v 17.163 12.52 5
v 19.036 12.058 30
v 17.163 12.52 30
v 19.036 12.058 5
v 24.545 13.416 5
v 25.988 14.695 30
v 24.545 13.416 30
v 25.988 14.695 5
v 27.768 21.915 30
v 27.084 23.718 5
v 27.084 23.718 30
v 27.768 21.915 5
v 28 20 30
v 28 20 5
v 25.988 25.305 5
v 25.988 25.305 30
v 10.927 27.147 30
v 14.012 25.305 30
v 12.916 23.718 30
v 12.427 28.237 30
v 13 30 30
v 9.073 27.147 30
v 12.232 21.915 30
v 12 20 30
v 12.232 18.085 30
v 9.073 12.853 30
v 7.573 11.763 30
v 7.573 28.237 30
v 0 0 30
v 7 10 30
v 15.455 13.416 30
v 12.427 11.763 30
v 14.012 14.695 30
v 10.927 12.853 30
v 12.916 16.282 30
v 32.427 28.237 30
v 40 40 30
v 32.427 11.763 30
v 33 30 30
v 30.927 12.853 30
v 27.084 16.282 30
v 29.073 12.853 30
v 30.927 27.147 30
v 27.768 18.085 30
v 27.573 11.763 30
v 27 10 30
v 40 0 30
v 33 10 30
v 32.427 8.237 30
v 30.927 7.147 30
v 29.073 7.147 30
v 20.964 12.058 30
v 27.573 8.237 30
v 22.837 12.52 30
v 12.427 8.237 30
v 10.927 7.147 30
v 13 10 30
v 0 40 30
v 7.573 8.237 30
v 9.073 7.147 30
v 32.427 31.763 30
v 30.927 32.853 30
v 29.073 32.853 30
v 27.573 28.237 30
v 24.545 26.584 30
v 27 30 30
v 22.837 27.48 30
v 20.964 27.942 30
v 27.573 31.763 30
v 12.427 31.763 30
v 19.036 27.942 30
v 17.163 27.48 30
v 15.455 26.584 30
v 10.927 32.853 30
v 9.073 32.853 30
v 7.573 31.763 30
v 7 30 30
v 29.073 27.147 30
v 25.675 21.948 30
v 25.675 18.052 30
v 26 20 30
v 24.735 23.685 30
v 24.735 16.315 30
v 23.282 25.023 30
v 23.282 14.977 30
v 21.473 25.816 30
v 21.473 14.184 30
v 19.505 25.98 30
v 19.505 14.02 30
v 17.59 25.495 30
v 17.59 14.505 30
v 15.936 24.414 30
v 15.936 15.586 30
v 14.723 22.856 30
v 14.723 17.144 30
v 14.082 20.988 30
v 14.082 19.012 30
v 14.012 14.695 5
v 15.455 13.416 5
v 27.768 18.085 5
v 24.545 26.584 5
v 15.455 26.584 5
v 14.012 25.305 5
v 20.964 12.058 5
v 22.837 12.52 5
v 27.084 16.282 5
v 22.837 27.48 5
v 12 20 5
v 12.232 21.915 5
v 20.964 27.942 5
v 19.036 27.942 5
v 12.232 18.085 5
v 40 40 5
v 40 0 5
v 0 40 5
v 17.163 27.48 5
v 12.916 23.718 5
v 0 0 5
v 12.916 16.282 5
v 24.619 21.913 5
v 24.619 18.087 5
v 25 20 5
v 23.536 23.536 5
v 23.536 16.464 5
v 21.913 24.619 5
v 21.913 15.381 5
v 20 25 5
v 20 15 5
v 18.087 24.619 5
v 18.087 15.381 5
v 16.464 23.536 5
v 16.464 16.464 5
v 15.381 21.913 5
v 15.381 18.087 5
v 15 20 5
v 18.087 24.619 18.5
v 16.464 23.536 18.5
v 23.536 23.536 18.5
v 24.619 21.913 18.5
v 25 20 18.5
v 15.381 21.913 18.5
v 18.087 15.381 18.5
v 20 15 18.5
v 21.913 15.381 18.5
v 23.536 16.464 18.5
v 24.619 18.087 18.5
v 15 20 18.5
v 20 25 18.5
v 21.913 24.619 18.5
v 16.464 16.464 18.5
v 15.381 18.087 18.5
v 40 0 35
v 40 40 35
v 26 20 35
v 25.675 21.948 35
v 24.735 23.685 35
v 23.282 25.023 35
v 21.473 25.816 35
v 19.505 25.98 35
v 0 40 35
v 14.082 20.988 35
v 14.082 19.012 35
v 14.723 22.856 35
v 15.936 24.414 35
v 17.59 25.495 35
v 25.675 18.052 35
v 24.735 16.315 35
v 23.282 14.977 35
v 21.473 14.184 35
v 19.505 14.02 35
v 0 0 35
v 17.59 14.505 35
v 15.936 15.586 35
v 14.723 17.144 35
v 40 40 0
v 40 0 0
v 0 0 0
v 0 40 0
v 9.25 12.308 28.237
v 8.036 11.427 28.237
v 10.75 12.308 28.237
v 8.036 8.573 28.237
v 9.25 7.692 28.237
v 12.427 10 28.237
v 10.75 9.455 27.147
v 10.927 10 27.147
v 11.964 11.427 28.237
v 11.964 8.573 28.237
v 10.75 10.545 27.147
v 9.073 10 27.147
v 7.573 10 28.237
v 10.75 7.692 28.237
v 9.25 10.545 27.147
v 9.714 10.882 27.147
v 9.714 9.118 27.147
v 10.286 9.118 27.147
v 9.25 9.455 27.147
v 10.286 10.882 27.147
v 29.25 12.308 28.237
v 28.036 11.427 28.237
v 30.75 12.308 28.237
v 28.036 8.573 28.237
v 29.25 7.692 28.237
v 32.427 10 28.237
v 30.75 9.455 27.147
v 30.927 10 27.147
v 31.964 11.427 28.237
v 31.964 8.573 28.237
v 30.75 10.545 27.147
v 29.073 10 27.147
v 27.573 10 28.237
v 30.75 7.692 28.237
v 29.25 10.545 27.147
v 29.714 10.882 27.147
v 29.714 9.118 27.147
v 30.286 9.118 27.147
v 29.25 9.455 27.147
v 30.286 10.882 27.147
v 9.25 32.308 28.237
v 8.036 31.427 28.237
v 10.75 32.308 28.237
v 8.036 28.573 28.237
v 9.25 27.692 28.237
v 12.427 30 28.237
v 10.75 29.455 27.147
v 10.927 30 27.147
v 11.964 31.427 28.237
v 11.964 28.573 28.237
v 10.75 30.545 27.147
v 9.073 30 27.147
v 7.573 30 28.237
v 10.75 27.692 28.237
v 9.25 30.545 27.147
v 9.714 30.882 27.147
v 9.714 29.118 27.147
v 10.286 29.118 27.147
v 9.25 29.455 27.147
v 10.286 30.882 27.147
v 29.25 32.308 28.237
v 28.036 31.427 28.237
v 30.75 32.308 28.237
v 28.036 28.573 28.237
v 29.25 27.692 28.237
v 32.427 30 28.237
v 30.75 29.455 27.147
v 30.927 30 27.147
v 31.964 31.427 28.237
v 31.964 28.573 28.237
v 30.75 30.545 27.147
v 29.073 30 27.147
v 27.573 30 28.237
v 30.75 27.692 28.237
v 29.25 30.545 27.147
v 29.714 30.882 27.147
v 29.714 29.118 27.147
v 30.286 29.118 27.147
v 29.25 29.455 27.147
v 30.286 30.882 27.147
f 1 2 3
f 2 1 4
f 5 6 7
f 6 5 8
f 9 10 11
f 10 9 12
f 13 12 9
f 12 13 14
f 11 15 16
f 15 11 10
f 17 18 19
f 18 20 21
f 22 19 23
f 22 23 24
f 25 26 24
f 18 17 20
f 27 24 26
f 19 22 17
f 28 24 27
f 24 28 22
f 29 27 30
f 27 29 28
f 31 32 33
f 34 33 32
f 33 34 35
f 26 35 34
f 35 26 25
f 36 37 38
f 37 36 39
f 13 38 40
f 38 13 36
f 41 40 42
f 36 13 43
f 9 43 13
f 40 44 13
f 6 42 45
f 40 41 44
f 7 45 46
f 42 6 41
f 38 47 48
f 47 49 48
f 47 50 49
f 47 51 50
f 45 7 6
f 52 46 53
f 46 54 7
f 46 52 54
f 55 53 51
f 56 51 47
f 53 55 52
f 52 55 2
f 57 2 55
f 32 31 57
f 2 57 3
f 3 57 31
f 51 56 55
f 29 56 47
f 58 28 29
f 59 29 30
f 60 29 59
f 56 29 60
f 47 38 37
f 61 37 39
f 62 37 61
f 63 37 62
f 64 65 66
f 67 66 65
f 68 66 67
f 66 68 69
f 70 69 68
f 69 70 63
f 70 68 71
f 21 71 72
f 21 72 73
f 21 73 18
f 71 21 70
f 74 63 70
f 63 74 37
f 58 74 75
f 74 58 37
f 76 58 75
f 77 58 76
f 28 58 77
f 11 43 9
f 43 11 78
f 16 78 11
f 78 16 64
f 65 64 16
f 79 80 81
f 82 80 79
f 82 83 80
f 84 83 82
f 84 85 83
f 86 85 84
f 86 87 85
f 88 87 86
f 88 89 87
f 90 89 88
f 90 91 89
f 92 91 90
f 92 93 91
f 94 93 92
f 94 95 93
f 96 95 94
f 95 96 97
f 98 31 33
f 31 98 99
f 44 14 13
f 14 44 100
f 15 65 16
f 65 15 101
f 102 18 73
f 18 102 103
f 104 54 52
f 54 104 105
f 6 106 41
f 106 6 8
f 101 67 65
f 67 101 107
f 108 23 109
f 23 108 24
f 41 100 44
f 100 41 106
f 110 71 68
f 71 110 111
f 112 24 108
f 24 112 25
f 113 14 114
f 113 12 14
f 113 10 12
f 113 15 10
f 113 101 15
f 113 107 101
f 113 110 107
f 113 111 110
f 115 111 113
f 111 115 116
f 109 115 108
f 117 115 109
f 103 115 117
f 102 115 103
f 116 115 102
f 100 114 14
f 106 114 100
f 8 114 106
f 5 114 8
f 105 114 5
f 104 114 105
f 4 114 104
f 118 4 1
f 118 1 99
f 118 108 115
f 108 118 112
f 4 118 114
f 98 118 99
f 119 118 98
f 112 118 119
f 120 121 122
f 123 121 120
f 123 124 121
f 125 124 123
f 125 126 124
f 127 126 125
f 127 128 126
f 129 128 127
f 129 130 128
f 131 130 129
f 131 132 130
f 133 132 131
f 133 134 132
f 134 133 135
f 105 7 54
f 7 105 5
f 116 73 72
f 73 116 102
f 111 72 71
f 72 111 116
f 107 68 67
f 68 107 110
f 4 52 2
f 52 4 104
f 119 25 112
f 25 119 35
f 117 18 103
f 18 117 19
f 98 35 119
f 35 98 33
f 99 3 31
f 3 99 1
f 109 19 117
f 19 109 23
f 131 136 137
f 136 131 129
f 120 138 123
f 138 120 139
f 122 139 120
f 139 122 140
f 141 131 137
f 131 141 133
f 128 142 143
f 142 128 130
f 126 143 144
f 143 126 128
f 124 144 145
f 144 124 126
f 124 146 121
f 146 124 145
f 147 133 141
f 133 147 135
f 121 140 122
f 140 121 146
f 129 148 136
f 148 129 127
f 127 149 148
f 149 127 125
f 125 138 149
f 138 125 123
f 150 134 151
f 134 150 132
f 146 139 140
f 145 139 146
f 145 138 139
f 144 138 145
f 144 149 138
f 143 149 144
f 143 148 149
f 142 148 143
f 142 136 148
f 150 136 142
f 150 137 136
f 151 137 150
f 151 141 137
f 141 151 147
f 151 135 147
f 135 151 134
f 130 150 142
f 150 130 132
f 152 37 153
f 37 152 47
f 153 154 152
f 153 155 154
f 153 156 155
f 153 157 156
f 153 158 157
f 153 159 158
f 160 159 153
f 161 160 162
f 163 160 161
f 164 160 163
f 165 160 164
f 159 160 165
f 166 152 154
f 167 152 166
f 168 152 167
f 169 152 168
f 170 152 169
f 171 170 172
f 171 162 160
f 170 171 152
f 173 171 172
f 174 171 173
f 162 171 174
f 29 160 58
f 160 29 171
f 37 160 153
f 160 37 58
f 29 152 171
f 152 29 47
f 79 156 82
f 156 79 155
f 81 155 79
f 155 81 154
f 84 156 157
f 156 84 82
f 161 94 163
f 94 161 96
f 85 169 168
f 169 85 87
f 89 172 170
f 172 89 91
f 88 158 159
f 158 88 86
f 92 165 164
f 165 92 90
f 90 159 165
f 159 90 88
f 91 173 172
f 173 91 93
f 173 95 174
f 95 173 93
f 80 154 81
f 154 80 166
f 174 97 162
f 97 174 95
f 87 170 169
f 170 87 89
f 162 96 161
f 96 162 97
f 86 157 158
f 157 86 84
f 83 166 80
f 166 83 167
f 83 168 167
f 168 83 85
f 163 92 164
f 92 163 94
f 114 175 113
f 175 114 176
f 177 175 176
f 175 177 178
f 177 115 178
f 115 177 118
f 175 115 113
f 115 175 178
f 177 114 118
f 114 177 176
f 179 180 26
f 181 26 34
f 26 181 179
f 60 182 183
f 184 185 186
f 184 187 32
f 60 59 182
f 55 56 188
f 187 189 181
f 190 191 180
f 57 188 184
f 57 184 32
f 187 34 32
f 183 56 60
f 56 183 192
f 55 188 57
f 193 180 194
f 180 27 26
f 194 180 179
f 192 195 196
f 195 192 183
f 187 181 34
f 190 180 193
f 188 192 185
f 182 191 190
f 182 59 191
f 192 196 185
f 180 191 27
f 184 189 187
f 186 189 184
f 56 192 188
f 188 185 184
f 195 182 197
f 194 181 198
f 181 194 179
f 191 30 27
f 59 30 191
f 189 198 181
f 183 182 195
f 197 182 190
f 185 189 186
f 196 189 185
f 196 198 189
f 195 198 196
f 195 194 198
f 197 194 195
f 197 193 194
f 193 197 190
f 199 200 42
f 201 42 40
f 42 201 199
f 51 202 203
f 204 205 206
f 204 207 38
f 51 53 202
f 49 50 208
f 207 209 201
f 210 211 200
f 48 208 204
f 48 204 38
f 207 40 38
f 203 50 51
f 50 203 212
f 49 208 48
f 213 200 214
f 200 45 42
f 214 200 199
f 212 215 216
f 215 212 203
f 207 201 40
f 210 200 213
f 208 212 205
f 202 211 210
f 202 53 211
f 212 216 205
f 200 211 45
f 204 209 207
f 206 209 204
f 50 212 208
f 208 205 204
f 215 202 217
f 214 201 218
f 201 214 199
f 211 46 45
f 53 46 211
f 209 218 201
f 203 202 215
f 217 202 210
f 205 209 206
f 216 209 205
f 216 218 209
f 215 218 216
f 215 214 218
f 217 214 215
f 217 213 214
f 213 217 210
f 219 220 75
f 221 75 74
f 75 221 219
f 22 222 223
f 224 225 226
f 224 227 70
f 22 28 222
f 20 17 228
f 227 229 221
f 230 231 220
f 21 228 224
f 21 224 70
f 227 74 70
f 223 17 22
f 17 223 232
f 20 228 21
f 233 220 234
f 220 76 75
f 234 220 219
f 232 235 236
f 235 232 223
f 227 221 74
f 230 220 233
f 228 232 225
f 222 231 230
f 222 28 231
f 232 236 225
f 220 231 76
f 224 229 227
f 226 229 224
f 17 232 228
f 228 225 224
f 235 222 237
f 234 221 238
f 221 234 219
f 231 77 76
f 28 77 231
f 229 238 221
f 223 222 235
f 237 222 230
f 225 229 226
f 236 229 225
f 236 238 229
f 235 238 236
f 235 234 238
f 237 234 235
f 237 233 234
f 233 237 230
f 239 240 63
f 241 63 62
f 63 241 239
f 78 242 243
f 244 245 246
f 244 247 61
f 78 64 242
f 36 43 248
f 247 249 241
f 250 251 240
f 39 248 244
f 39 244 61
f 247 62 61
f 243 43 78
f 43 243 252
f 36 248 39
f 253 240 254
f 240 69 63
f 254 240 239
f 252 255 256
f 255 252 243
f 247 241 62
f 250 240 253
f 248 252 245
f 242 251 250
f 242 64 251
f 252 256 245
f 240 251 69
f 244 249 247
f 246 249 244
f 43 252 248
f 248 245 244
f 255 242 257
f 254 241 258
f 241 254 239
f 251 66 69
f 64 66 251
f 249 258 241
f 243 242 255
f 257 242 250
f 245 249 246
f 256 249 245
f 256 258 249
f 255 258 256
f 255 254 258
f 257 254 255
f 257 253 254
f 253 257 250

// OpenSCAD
// Assembly of multiple parts
// Part 1: Base
cube([40, 40, 5]);

// Part 2: Pillar
translate([20, 20, 5]) {
    difference() {
        cylinder(h=25, r=8);
        cylinder(h=27, r=5, center=true);
    }
}

// Part 3: Top plate
translate([0, 0, 30]) {
    difference() {
        cube([40, 40, 5]);
        translate([20, 20, -1]) cylinder(h=7, r=6);
    }
}

// Part 4: Decorative spheres
translate([10, 10, 30]) sphere(r=3);
translate([30, 10, 30]) sphere(r=3);
translate([10, 30, 30]) sphere(r=3);
translate([30, 30, 30]) sphere(r=3);
